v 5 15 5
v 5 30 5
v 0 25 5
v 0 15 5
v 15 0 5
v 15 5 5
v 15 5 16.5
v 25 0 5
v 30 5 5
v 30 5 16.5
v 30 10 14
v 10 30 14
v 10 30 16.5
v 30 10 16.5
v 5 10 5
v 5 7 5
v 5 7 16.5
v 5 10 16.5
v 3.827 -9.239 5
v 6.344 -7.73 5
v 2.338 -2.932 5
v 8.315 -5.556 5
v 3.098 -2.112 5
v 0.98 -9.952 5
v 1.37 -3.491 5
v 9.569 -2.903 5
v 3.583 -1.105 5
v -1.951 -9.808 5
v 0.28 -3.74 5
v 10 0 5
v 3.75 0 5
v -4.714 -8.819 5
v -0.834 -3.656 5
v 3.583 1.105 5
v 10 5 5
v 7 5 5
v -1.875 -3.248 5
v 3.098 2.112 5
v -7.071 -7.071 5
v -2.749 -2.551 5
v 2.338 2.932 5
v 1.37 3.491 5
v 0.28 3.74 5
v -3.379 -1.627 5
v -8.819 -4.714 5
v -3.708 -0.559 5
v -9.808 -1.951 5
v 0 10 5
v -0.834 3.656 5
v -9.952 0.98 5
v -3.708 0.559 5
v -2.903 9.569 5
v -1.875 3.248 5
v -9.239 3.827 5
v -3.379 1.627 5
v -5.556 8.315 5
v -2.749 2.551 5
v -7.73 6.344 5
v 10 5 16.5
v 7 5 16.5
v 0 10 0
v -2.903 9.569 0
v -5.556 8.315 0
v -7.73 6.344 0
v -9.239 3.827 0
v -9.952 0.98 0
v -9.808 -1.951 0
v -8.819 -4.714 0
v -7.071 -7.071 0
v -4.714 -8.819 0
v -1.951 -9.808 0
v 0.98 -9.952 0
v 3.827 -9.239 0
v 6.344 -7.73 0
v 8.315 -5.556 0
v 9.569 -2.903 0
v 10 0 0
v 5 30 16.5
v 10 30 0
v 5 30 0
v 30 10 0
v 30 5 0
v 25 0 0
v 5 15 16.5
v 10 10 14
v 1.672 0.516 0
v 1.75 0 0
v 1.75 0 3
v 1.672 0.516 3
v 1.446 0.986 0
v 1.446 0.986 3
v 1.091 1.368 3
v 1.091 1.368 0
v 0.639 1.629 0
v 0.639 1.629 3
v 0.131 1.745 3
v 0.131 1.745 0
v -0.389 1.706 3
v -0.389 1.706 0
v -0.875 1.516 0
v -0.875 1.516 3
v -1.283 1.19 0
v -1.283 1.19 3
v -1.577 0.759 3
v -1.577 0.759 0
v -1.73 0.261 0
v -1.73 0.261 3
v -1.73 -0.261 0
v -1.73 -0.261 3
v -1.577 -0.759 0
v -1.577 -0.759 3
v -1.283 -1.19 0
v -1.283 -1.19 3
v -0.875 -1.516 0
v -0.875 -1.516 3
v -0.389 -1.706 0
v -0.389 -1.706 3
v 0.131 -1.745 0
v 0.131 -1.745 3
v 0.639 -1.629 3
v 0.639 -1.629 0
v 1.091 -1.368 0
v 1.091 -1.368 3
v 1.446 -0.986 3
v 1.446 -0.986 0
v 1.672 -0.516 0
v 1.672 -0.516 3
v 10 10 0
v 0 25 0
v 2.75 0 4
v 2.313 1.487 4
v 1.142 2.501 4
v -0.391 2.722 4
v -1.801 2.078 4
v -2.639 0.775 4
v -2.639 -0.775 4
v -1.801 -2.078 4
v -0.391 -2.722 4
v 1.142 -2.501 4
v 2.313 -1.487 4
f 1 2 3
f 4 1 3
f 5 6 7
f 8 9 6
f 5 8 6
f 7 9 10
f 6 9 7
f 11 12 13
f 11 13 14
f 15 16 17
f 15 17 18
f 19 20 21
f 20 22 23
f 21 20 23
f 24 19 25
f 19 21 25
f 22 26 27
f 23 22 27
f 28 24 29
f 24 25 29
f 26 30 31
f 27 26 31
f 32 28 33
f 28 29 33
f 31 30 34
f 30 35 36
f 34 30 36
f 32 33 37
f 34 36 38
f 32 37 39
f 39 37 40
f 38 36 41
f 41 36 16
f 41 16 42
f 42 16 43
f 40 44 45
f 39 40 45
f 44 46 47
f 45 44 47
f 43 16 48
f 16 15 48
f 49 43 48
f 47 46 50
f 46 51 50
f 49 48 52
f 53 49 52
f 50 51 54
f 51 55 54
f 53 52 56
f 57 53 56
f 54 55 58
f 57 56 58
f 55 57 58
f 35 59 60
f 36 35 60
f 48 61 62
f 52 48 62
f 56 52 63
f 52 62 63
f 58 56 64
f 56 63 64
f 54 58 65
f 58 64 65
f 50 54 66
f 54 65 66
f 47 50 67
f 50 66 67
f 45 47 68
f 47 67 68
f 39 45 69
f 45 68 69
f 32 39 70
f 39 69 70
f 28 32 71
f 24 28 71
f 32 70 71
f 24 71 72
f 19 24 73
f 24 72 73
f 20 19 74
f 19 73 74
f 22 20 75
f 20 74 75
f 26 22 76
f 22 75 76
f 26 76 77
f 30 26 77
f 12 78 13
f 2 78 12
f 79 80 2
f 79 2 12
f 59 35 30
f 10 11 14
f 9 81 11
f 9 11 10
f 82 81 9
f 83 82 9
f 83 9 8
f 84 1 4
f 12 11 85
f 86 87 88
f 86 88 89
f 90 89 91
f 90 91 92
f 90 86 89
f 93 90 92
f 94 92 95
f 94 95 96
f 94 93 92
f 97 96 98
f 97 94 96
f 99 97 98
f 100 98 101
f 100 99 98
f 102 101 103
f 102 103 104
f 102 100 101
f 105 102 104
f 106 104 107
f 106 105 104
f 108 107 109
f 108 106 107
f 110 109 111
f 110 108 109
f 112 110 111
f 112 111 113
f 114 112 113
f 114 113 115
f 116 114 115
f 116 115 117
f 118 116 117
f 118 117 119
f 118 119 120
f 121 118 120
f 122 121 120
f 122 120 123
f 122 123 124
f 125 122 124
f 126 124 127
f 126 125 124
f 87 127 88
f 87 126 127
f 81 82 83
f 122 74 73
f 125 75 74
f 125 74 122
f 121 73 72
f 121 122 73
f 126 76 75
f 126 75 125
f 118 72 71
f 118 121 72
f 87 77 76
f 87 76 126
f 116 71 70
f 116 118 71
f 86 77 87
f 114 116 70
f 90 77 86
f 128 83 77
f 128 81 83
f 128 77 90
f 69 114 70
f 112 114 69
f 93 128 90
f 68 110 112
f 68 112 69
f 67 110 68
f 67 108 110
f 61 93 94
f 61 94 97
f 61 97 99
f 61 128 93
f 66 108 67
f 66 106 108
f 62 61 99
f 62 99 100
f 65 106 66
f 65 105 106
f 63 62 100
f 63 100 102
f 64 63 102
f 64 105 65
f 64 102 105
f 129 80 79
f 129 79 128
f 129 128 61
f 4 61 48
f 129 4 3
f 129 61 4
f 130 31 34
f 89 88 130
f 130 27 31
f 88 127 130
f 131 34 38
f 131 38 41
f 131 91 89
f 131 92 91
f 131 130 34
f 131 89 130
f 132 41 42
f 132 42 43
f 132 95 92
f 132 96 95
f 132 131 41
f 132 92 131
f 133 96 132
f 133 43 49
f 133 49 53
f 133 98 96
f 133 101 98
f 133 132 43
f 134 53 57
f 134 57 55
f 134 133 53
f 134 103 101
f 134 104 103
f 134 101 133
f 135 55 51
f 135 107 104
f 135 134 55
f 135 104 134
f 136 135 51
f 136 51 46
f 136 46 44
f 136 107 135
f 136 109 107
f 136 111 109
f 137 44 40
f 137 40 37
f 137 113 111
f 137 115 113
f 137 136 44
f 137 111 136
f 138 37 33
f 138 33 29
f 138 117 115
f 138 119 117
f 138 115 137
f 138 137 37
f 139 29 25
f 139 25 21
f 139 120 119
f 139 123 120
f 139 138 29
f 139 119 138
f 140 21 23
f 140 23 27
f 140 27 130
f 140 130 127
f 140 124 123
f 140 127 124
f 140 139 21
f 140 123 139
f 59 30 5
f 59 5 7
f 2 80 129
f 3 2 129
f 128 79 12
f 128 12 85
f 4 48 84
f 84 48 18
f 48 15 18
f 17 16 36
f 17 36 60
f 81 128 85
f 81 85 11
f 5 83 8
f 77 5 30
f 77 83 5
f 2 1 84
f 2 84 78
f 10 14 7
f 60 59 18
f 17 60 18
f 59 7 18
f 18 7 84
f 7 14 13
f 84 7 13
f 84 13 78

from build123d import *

# Parameters (mm, degrees)
EXTRUDE003_DEPTH                          = 5
EXTRUDE003_ONTO_SKETCH003_ROLL_ANGLE      = 90
EXTRUDE003_ONTO_SKETCH003_PLACEMENT_ANGLE = -90
EXTRUDE001_DEPTH                          = 9
EXTRUDE002_DEPTH                          = 2.5
SKETCH_R                                  = 1.75
EXTRUDE_DEPTH                             = 5
CHAMFER_SIZE                              = 2


with BuildPart() as extrude003:
    # Sketch003 as drawn → Extrude003 (new)
    with BuildSketch(Plane.XY):
        Polygon((-5, 16.5), (-5, 5), (0, 5), align=None)
    extrude(amount=-EXTRUDE003_DEPTH)


with BuildPart() as extrude003_1:
    # Extrude003 onto Sketch003 roll: moved
    add(extrude003.part.rotate(Axis((0, 0, 0), (1, 0, 0)), EXTRUDE003_ONTO_SKETCH003_ROLL_ANGLE))


with BuildPart() as extrude003_2:
    # Extrude003 onto Sketch003 placement: moved
    add(extrude003_1.part.moved(Location((5, 0, 0))).rotate(Axis((5, 0, 0), (0, 0, 1)), EXTRUDE003_ONTO_SKETCH003_PLACEMENT_ANGLE))


with BuildPart() as extrude003_3:
    # Extrude003 placement: moved
    add(extrude003_2.part.moved(Location((5, 0, 0))))


with BuildPart() as extrude003_mirrored:
    # mirror: instance of Extrude003
    add(extrude003_3.part.mirror(Plane(origin=(5, 5, 2), x_dir=(0.707107, 0.707107, 0), z_dir=(-0.707107, 0.707107, 0))))


with BuildPart() as extrude001:
    # Sketch001 (on Face12 of Extrude) → Extrude001 (new body)
    with BuildSketch(Plane.XY.offset(5)):
        Polygon((5, 30), (10, 30), (10, 10), (30, 10), (30, 5), (5, 5), align=None)
    extrude(amount=EXTRUDE001_DEPTH)


with BuildPart() as extrude002:
    # Sketch002 (on Face8 of Extrude001) → Extrude002 (new body)
    with BuildSketch(Plane.XY.offset(14)):
        Polygon((5, 30), (10, 30), (30, 10), (30, 5), (5, 5), align=None)
    extrude(amount=EXTRUDE002_DEPTH)


with BuildPart() as chamfer_body:
    # Sketch → Extrude (new body)
    with BuildSketch(Plane.XY):
        with BuildLine():
            Line((5, 30), (10, 30))
            Line((10, 10), (10, 30))
            Line((30, 10), (10, 10))
            Line((30, 10), (30, 5))
            Line((30, 5), (25, 0))
            Line((25, 0), (10, 0))
            ThreePointArc((0, 10), (-7.071068, -7.071068), (10, 0))
            Line((0, 10), (0, 25))
            Line((5, 30), (0, 25))
        make_face()
        Circle(SKETCH_R, mode=Mode.SUBTRACT)
    extrude(amount=EXTRUDE_DEPTH)

    # Fusion: union Extrude001, Extrude002
    add(extrude001.part)
    add(extrude002.part)

    # Fusion001: union Extrude003, Extrude003 (mirrored)
    add(extrude003_3.part)
    add(extrude003_mirrored.part)

    # Chamfer
    chamfer_edges = [chamfer_body.edges().sort_by_distance(p)[0] for p in [
        (5, 5, 10.75),
        (-1.75, 0, 5),
    ]]
    chamfer(chamfer_edges, length=CHAMFER_SIZE)


solid = chamfer_body.part
